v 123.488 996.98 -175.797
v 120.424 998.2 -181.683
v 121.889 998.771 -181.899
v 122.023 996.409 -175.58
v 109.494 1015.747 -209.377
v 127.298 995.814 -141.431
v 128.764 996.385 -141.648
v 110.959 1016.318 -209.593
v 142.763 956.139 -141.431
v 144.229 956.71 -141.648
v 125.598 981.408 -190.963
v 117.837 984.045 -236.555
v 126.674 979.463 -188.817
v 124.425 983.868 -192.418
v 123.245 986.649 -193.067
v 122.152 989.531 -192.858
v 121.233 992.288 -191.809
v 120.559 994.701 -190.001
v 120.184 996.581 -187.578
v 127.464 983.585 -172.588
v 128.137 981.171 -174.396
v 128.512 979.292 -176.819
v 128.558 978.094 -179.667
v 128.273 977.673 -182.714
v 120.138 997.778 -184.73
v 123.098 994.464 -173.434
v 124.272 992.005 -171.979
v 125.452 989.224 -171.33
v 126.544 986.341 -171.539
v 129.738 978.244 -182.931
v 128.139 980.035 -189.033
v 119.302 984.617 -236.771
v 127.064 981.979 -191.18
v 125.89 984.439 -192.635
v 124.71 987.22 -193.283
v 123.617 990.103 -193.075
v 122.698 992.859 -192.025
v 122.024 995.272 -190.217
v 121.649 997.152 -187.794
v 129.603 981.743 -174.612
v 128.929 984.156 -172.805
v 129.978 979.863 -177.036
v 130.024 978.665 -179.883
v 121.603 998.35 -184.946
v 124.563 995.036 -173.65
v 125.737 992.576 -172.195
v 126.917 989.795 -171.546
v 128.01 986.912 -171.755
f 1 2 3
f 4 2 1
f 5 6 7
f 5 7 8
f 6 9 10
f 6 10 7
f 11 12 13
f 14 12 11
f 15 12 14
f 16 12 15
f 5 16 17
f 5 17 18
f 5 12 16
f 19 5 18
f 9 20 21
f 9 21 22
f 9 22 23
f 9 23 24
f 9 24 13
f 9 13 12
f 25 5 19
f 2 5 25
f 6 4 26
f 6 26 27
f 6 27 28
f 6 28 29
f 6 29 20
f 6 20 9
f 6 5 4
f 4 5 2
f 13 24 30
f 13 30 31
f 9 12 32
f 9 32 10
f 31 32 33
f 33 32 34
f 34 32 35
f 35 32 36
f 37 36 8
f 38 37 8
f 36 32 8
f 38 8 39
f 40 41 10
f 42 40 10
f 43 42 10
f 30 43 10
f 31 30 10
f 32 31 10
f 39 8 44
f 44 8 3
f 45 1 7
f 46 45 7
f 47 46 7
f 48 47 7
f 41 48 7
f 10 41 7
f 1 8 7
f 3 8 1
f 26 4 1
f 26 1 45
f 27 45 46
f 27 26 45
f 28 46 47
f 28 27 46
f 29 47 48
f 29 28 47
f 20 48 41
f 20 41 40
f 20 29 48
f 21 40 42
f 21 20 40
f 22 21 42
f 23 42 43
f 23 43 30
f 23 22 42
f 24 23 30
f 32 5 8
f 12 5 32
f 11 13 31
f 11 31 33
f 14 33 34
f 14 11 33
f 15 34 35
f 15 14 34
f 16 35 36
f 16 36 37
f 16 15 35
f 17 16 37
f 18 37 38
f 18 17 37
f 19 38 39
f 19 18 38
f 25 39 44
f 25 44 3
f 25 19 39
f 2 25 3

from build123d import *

# Parameters (mm, degrees)
BOSS_EXTRUDE1_DEPTH = 1.5875


with BuildPart() as part:
    # Sketch40 → Boss-Extrude1 (new body)
    with BuildSketch(Plane(origin=(-456.955039877, 178.120588246, -67.48659487), x_dir=(-0.1270105543825624, 0.04950857893190621, 0.9906650390962515), z_dir=(-0.9230204054682253, 0.35979237176022855, -0.13631867191409483))):
        Polygon((-143.227084656, 906.623268698), (-170.661347691, 874.056453533), (-74.641427067, 839.002915601), (-74.641427067, 881.585027318), align=None)
        with BuildLine():
            Line((-115.271977523, 886.304578524), (-109.11217167, 884.055847358))
            ThreePointArc((-109.11217167, 884.055847358), (-105.459844174, 871.54470512), (-116.313665717, 864.329254051))
            Line((-116.313665717, 864.329254051), (-122.47347157, 866.577985217))
            ThreePointArc((-122.47347157, 866.577985217), (-126.125799067, 879.089127455), (-115.271977523, 886.304578524))
        make_face(mode=Mode.SUBTRACT)
    extrude(amount=BOSS_EXTRUDE1_DEPTH)


with BuildPart() as body_2:
    # Mirror2: mirrored copy
    add(part.part.mirror(Plane(origin=(0, 0, 0), x_dir=(0, 0, 1), z_dir=(1, 0, 0))))


solid = body_2.part
